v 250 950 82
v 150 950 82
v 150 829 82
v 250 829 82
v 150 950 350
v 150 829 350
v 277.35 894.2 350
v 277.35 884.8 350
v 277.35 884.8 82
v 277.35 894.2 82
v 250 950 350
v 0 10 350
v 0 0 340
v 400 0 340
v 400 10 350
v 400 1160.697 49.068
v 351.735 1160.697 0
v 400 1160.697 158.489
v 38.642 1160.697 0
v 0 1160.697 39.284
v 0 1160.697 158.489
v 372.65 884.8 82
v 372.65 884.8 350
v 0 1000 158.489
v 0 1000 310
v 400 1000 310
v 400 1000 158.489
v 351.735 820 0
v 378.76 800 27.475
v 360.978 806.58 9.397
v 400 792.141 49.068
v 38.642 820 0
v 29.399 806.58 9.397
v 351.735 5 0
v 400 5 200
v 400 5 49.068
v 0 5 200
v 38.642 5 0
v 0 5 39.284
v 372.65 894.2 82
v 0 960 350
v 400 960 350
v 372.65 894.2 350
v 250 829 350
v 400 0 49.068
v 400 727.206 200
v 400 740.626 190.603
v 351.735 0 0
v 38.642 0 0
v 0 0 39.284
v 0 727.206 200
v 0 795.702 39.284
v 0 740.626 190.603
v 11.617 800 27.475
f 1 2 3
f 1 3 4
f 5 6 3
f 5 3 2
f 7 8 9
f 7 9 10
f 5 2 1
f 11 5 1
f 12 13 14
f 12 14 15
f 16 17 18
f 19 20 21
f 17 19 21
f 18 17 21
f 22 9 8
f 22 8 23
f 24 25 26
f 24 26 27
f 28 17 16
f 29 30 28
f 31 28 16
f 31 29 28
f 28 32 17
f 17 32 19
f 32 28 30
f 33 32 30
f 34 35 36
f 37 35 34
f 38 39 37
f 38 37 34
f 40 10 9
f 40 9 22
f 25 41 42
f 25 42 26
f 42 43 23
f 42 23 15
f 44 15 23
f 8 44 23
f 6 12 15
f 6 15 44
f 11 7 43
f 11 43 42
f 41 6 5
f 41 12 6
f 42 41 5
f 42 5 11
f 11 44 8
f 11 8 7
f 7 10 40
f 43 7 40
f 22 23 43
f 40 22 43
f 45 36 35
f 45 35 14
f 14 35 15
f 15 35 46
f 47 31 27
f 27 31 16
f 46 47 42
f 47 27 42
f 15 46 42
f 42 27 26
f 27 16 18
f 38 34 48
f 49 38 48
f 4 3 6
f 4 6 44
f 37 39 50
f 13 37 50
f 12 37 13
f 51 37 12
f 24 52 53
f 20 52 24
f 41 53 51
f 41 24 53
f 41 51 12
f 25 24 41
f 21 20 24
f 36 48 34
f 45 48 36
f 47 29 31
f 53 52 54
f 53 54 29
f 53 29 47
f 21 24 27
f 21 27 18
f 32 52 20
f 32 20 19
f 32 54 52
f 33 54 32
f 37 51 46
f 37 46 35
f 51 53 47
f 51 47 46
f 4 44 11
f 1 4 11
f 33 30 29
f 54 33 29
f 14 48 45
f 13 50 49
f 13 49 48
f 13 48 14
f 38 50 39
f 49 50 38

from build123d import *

# Parameters (mm, degrees)
BOSS_EXTRUDE1_DEPTH     = 400
SKETCH2_W               = 100
SKETCH2_H               = 121
SKETCH2_W_2             = 95.3
SKETCH2_H_2             = 9.4
CUT_EXTRUDE1_DEPTH      = 268
CUT_EXTRUDE2_DEPTH      = 1
CUT_EXTRUDE2_DEPTH_BACK = 1161.696902422


with BuildPart() as part:
    # Sketch1 → Boss-Extrude1 (new body)
    with BuildSketch(Plane(origin=(0, 0, 0), x_dir=(0, 0, -1), z_dir=(1, 0, 0))):
        Polygon((0, 0), (-340, 0), (-350, 10), (-350, 960), (-310, 1000), (-158.48888922, 1000), (-158.48888922, 1160.696902422), (-108.48888922, 1160.696902422), (0, 1160.696902422), (0, 1000), (0, 970), (0, 820), (-9.396926208, 806.579798567), (-27.474774195, 800), (-190.603073792, 740.62615458), (-200, 727.205953147), (-200, 5), (0, 5), align=None)
    extrude(amount=BOSS_EXTRUDE1_DEPTH)

    # Sketch2 → Cut-Extrude1 (cut)
    with BuildSketch(Plane.XY.offset(350)):
        with Locations((200, 889.5)):
            Rectangle(SKETCH2_W, SKETCH2_H)
        with Locations((325, 889.5)):
            Rectangle(SKETCH2_W_2, SKETCH2_H_2)
    extrude(amount=-CUT_EXTRUDE1_DEPTH, mode=Mode.SUBTRACT)

    # Sketch3 → Cut-Extrude2 (cut, two sides)
    with BuildSketch(Plane(origin=(0, 0, 0), x_dir=(-1, 0, 0), z_dir=(0, -1, 0))) as cut_extrude2_sk:
        Polygon((32.971910004, -72.804395349), (-67.728153305, 29.569560354), (-322.648629759, 29.569560354), (-423.348693067, -72.804395349), (-423.348693067, 100.069531779), (32.971910004, 100.069531779), align=None)
    extrude(amount=CUT_EXTRUDE2_DEPTH, mode=Mode.SUBTRACT)
    extrude(cut_extrude2_sk.sketch, amount=-CUT_EXTRUDE2_DEPTH_BACK, mode=Mode.SUBTRACT)


solid = part.part
